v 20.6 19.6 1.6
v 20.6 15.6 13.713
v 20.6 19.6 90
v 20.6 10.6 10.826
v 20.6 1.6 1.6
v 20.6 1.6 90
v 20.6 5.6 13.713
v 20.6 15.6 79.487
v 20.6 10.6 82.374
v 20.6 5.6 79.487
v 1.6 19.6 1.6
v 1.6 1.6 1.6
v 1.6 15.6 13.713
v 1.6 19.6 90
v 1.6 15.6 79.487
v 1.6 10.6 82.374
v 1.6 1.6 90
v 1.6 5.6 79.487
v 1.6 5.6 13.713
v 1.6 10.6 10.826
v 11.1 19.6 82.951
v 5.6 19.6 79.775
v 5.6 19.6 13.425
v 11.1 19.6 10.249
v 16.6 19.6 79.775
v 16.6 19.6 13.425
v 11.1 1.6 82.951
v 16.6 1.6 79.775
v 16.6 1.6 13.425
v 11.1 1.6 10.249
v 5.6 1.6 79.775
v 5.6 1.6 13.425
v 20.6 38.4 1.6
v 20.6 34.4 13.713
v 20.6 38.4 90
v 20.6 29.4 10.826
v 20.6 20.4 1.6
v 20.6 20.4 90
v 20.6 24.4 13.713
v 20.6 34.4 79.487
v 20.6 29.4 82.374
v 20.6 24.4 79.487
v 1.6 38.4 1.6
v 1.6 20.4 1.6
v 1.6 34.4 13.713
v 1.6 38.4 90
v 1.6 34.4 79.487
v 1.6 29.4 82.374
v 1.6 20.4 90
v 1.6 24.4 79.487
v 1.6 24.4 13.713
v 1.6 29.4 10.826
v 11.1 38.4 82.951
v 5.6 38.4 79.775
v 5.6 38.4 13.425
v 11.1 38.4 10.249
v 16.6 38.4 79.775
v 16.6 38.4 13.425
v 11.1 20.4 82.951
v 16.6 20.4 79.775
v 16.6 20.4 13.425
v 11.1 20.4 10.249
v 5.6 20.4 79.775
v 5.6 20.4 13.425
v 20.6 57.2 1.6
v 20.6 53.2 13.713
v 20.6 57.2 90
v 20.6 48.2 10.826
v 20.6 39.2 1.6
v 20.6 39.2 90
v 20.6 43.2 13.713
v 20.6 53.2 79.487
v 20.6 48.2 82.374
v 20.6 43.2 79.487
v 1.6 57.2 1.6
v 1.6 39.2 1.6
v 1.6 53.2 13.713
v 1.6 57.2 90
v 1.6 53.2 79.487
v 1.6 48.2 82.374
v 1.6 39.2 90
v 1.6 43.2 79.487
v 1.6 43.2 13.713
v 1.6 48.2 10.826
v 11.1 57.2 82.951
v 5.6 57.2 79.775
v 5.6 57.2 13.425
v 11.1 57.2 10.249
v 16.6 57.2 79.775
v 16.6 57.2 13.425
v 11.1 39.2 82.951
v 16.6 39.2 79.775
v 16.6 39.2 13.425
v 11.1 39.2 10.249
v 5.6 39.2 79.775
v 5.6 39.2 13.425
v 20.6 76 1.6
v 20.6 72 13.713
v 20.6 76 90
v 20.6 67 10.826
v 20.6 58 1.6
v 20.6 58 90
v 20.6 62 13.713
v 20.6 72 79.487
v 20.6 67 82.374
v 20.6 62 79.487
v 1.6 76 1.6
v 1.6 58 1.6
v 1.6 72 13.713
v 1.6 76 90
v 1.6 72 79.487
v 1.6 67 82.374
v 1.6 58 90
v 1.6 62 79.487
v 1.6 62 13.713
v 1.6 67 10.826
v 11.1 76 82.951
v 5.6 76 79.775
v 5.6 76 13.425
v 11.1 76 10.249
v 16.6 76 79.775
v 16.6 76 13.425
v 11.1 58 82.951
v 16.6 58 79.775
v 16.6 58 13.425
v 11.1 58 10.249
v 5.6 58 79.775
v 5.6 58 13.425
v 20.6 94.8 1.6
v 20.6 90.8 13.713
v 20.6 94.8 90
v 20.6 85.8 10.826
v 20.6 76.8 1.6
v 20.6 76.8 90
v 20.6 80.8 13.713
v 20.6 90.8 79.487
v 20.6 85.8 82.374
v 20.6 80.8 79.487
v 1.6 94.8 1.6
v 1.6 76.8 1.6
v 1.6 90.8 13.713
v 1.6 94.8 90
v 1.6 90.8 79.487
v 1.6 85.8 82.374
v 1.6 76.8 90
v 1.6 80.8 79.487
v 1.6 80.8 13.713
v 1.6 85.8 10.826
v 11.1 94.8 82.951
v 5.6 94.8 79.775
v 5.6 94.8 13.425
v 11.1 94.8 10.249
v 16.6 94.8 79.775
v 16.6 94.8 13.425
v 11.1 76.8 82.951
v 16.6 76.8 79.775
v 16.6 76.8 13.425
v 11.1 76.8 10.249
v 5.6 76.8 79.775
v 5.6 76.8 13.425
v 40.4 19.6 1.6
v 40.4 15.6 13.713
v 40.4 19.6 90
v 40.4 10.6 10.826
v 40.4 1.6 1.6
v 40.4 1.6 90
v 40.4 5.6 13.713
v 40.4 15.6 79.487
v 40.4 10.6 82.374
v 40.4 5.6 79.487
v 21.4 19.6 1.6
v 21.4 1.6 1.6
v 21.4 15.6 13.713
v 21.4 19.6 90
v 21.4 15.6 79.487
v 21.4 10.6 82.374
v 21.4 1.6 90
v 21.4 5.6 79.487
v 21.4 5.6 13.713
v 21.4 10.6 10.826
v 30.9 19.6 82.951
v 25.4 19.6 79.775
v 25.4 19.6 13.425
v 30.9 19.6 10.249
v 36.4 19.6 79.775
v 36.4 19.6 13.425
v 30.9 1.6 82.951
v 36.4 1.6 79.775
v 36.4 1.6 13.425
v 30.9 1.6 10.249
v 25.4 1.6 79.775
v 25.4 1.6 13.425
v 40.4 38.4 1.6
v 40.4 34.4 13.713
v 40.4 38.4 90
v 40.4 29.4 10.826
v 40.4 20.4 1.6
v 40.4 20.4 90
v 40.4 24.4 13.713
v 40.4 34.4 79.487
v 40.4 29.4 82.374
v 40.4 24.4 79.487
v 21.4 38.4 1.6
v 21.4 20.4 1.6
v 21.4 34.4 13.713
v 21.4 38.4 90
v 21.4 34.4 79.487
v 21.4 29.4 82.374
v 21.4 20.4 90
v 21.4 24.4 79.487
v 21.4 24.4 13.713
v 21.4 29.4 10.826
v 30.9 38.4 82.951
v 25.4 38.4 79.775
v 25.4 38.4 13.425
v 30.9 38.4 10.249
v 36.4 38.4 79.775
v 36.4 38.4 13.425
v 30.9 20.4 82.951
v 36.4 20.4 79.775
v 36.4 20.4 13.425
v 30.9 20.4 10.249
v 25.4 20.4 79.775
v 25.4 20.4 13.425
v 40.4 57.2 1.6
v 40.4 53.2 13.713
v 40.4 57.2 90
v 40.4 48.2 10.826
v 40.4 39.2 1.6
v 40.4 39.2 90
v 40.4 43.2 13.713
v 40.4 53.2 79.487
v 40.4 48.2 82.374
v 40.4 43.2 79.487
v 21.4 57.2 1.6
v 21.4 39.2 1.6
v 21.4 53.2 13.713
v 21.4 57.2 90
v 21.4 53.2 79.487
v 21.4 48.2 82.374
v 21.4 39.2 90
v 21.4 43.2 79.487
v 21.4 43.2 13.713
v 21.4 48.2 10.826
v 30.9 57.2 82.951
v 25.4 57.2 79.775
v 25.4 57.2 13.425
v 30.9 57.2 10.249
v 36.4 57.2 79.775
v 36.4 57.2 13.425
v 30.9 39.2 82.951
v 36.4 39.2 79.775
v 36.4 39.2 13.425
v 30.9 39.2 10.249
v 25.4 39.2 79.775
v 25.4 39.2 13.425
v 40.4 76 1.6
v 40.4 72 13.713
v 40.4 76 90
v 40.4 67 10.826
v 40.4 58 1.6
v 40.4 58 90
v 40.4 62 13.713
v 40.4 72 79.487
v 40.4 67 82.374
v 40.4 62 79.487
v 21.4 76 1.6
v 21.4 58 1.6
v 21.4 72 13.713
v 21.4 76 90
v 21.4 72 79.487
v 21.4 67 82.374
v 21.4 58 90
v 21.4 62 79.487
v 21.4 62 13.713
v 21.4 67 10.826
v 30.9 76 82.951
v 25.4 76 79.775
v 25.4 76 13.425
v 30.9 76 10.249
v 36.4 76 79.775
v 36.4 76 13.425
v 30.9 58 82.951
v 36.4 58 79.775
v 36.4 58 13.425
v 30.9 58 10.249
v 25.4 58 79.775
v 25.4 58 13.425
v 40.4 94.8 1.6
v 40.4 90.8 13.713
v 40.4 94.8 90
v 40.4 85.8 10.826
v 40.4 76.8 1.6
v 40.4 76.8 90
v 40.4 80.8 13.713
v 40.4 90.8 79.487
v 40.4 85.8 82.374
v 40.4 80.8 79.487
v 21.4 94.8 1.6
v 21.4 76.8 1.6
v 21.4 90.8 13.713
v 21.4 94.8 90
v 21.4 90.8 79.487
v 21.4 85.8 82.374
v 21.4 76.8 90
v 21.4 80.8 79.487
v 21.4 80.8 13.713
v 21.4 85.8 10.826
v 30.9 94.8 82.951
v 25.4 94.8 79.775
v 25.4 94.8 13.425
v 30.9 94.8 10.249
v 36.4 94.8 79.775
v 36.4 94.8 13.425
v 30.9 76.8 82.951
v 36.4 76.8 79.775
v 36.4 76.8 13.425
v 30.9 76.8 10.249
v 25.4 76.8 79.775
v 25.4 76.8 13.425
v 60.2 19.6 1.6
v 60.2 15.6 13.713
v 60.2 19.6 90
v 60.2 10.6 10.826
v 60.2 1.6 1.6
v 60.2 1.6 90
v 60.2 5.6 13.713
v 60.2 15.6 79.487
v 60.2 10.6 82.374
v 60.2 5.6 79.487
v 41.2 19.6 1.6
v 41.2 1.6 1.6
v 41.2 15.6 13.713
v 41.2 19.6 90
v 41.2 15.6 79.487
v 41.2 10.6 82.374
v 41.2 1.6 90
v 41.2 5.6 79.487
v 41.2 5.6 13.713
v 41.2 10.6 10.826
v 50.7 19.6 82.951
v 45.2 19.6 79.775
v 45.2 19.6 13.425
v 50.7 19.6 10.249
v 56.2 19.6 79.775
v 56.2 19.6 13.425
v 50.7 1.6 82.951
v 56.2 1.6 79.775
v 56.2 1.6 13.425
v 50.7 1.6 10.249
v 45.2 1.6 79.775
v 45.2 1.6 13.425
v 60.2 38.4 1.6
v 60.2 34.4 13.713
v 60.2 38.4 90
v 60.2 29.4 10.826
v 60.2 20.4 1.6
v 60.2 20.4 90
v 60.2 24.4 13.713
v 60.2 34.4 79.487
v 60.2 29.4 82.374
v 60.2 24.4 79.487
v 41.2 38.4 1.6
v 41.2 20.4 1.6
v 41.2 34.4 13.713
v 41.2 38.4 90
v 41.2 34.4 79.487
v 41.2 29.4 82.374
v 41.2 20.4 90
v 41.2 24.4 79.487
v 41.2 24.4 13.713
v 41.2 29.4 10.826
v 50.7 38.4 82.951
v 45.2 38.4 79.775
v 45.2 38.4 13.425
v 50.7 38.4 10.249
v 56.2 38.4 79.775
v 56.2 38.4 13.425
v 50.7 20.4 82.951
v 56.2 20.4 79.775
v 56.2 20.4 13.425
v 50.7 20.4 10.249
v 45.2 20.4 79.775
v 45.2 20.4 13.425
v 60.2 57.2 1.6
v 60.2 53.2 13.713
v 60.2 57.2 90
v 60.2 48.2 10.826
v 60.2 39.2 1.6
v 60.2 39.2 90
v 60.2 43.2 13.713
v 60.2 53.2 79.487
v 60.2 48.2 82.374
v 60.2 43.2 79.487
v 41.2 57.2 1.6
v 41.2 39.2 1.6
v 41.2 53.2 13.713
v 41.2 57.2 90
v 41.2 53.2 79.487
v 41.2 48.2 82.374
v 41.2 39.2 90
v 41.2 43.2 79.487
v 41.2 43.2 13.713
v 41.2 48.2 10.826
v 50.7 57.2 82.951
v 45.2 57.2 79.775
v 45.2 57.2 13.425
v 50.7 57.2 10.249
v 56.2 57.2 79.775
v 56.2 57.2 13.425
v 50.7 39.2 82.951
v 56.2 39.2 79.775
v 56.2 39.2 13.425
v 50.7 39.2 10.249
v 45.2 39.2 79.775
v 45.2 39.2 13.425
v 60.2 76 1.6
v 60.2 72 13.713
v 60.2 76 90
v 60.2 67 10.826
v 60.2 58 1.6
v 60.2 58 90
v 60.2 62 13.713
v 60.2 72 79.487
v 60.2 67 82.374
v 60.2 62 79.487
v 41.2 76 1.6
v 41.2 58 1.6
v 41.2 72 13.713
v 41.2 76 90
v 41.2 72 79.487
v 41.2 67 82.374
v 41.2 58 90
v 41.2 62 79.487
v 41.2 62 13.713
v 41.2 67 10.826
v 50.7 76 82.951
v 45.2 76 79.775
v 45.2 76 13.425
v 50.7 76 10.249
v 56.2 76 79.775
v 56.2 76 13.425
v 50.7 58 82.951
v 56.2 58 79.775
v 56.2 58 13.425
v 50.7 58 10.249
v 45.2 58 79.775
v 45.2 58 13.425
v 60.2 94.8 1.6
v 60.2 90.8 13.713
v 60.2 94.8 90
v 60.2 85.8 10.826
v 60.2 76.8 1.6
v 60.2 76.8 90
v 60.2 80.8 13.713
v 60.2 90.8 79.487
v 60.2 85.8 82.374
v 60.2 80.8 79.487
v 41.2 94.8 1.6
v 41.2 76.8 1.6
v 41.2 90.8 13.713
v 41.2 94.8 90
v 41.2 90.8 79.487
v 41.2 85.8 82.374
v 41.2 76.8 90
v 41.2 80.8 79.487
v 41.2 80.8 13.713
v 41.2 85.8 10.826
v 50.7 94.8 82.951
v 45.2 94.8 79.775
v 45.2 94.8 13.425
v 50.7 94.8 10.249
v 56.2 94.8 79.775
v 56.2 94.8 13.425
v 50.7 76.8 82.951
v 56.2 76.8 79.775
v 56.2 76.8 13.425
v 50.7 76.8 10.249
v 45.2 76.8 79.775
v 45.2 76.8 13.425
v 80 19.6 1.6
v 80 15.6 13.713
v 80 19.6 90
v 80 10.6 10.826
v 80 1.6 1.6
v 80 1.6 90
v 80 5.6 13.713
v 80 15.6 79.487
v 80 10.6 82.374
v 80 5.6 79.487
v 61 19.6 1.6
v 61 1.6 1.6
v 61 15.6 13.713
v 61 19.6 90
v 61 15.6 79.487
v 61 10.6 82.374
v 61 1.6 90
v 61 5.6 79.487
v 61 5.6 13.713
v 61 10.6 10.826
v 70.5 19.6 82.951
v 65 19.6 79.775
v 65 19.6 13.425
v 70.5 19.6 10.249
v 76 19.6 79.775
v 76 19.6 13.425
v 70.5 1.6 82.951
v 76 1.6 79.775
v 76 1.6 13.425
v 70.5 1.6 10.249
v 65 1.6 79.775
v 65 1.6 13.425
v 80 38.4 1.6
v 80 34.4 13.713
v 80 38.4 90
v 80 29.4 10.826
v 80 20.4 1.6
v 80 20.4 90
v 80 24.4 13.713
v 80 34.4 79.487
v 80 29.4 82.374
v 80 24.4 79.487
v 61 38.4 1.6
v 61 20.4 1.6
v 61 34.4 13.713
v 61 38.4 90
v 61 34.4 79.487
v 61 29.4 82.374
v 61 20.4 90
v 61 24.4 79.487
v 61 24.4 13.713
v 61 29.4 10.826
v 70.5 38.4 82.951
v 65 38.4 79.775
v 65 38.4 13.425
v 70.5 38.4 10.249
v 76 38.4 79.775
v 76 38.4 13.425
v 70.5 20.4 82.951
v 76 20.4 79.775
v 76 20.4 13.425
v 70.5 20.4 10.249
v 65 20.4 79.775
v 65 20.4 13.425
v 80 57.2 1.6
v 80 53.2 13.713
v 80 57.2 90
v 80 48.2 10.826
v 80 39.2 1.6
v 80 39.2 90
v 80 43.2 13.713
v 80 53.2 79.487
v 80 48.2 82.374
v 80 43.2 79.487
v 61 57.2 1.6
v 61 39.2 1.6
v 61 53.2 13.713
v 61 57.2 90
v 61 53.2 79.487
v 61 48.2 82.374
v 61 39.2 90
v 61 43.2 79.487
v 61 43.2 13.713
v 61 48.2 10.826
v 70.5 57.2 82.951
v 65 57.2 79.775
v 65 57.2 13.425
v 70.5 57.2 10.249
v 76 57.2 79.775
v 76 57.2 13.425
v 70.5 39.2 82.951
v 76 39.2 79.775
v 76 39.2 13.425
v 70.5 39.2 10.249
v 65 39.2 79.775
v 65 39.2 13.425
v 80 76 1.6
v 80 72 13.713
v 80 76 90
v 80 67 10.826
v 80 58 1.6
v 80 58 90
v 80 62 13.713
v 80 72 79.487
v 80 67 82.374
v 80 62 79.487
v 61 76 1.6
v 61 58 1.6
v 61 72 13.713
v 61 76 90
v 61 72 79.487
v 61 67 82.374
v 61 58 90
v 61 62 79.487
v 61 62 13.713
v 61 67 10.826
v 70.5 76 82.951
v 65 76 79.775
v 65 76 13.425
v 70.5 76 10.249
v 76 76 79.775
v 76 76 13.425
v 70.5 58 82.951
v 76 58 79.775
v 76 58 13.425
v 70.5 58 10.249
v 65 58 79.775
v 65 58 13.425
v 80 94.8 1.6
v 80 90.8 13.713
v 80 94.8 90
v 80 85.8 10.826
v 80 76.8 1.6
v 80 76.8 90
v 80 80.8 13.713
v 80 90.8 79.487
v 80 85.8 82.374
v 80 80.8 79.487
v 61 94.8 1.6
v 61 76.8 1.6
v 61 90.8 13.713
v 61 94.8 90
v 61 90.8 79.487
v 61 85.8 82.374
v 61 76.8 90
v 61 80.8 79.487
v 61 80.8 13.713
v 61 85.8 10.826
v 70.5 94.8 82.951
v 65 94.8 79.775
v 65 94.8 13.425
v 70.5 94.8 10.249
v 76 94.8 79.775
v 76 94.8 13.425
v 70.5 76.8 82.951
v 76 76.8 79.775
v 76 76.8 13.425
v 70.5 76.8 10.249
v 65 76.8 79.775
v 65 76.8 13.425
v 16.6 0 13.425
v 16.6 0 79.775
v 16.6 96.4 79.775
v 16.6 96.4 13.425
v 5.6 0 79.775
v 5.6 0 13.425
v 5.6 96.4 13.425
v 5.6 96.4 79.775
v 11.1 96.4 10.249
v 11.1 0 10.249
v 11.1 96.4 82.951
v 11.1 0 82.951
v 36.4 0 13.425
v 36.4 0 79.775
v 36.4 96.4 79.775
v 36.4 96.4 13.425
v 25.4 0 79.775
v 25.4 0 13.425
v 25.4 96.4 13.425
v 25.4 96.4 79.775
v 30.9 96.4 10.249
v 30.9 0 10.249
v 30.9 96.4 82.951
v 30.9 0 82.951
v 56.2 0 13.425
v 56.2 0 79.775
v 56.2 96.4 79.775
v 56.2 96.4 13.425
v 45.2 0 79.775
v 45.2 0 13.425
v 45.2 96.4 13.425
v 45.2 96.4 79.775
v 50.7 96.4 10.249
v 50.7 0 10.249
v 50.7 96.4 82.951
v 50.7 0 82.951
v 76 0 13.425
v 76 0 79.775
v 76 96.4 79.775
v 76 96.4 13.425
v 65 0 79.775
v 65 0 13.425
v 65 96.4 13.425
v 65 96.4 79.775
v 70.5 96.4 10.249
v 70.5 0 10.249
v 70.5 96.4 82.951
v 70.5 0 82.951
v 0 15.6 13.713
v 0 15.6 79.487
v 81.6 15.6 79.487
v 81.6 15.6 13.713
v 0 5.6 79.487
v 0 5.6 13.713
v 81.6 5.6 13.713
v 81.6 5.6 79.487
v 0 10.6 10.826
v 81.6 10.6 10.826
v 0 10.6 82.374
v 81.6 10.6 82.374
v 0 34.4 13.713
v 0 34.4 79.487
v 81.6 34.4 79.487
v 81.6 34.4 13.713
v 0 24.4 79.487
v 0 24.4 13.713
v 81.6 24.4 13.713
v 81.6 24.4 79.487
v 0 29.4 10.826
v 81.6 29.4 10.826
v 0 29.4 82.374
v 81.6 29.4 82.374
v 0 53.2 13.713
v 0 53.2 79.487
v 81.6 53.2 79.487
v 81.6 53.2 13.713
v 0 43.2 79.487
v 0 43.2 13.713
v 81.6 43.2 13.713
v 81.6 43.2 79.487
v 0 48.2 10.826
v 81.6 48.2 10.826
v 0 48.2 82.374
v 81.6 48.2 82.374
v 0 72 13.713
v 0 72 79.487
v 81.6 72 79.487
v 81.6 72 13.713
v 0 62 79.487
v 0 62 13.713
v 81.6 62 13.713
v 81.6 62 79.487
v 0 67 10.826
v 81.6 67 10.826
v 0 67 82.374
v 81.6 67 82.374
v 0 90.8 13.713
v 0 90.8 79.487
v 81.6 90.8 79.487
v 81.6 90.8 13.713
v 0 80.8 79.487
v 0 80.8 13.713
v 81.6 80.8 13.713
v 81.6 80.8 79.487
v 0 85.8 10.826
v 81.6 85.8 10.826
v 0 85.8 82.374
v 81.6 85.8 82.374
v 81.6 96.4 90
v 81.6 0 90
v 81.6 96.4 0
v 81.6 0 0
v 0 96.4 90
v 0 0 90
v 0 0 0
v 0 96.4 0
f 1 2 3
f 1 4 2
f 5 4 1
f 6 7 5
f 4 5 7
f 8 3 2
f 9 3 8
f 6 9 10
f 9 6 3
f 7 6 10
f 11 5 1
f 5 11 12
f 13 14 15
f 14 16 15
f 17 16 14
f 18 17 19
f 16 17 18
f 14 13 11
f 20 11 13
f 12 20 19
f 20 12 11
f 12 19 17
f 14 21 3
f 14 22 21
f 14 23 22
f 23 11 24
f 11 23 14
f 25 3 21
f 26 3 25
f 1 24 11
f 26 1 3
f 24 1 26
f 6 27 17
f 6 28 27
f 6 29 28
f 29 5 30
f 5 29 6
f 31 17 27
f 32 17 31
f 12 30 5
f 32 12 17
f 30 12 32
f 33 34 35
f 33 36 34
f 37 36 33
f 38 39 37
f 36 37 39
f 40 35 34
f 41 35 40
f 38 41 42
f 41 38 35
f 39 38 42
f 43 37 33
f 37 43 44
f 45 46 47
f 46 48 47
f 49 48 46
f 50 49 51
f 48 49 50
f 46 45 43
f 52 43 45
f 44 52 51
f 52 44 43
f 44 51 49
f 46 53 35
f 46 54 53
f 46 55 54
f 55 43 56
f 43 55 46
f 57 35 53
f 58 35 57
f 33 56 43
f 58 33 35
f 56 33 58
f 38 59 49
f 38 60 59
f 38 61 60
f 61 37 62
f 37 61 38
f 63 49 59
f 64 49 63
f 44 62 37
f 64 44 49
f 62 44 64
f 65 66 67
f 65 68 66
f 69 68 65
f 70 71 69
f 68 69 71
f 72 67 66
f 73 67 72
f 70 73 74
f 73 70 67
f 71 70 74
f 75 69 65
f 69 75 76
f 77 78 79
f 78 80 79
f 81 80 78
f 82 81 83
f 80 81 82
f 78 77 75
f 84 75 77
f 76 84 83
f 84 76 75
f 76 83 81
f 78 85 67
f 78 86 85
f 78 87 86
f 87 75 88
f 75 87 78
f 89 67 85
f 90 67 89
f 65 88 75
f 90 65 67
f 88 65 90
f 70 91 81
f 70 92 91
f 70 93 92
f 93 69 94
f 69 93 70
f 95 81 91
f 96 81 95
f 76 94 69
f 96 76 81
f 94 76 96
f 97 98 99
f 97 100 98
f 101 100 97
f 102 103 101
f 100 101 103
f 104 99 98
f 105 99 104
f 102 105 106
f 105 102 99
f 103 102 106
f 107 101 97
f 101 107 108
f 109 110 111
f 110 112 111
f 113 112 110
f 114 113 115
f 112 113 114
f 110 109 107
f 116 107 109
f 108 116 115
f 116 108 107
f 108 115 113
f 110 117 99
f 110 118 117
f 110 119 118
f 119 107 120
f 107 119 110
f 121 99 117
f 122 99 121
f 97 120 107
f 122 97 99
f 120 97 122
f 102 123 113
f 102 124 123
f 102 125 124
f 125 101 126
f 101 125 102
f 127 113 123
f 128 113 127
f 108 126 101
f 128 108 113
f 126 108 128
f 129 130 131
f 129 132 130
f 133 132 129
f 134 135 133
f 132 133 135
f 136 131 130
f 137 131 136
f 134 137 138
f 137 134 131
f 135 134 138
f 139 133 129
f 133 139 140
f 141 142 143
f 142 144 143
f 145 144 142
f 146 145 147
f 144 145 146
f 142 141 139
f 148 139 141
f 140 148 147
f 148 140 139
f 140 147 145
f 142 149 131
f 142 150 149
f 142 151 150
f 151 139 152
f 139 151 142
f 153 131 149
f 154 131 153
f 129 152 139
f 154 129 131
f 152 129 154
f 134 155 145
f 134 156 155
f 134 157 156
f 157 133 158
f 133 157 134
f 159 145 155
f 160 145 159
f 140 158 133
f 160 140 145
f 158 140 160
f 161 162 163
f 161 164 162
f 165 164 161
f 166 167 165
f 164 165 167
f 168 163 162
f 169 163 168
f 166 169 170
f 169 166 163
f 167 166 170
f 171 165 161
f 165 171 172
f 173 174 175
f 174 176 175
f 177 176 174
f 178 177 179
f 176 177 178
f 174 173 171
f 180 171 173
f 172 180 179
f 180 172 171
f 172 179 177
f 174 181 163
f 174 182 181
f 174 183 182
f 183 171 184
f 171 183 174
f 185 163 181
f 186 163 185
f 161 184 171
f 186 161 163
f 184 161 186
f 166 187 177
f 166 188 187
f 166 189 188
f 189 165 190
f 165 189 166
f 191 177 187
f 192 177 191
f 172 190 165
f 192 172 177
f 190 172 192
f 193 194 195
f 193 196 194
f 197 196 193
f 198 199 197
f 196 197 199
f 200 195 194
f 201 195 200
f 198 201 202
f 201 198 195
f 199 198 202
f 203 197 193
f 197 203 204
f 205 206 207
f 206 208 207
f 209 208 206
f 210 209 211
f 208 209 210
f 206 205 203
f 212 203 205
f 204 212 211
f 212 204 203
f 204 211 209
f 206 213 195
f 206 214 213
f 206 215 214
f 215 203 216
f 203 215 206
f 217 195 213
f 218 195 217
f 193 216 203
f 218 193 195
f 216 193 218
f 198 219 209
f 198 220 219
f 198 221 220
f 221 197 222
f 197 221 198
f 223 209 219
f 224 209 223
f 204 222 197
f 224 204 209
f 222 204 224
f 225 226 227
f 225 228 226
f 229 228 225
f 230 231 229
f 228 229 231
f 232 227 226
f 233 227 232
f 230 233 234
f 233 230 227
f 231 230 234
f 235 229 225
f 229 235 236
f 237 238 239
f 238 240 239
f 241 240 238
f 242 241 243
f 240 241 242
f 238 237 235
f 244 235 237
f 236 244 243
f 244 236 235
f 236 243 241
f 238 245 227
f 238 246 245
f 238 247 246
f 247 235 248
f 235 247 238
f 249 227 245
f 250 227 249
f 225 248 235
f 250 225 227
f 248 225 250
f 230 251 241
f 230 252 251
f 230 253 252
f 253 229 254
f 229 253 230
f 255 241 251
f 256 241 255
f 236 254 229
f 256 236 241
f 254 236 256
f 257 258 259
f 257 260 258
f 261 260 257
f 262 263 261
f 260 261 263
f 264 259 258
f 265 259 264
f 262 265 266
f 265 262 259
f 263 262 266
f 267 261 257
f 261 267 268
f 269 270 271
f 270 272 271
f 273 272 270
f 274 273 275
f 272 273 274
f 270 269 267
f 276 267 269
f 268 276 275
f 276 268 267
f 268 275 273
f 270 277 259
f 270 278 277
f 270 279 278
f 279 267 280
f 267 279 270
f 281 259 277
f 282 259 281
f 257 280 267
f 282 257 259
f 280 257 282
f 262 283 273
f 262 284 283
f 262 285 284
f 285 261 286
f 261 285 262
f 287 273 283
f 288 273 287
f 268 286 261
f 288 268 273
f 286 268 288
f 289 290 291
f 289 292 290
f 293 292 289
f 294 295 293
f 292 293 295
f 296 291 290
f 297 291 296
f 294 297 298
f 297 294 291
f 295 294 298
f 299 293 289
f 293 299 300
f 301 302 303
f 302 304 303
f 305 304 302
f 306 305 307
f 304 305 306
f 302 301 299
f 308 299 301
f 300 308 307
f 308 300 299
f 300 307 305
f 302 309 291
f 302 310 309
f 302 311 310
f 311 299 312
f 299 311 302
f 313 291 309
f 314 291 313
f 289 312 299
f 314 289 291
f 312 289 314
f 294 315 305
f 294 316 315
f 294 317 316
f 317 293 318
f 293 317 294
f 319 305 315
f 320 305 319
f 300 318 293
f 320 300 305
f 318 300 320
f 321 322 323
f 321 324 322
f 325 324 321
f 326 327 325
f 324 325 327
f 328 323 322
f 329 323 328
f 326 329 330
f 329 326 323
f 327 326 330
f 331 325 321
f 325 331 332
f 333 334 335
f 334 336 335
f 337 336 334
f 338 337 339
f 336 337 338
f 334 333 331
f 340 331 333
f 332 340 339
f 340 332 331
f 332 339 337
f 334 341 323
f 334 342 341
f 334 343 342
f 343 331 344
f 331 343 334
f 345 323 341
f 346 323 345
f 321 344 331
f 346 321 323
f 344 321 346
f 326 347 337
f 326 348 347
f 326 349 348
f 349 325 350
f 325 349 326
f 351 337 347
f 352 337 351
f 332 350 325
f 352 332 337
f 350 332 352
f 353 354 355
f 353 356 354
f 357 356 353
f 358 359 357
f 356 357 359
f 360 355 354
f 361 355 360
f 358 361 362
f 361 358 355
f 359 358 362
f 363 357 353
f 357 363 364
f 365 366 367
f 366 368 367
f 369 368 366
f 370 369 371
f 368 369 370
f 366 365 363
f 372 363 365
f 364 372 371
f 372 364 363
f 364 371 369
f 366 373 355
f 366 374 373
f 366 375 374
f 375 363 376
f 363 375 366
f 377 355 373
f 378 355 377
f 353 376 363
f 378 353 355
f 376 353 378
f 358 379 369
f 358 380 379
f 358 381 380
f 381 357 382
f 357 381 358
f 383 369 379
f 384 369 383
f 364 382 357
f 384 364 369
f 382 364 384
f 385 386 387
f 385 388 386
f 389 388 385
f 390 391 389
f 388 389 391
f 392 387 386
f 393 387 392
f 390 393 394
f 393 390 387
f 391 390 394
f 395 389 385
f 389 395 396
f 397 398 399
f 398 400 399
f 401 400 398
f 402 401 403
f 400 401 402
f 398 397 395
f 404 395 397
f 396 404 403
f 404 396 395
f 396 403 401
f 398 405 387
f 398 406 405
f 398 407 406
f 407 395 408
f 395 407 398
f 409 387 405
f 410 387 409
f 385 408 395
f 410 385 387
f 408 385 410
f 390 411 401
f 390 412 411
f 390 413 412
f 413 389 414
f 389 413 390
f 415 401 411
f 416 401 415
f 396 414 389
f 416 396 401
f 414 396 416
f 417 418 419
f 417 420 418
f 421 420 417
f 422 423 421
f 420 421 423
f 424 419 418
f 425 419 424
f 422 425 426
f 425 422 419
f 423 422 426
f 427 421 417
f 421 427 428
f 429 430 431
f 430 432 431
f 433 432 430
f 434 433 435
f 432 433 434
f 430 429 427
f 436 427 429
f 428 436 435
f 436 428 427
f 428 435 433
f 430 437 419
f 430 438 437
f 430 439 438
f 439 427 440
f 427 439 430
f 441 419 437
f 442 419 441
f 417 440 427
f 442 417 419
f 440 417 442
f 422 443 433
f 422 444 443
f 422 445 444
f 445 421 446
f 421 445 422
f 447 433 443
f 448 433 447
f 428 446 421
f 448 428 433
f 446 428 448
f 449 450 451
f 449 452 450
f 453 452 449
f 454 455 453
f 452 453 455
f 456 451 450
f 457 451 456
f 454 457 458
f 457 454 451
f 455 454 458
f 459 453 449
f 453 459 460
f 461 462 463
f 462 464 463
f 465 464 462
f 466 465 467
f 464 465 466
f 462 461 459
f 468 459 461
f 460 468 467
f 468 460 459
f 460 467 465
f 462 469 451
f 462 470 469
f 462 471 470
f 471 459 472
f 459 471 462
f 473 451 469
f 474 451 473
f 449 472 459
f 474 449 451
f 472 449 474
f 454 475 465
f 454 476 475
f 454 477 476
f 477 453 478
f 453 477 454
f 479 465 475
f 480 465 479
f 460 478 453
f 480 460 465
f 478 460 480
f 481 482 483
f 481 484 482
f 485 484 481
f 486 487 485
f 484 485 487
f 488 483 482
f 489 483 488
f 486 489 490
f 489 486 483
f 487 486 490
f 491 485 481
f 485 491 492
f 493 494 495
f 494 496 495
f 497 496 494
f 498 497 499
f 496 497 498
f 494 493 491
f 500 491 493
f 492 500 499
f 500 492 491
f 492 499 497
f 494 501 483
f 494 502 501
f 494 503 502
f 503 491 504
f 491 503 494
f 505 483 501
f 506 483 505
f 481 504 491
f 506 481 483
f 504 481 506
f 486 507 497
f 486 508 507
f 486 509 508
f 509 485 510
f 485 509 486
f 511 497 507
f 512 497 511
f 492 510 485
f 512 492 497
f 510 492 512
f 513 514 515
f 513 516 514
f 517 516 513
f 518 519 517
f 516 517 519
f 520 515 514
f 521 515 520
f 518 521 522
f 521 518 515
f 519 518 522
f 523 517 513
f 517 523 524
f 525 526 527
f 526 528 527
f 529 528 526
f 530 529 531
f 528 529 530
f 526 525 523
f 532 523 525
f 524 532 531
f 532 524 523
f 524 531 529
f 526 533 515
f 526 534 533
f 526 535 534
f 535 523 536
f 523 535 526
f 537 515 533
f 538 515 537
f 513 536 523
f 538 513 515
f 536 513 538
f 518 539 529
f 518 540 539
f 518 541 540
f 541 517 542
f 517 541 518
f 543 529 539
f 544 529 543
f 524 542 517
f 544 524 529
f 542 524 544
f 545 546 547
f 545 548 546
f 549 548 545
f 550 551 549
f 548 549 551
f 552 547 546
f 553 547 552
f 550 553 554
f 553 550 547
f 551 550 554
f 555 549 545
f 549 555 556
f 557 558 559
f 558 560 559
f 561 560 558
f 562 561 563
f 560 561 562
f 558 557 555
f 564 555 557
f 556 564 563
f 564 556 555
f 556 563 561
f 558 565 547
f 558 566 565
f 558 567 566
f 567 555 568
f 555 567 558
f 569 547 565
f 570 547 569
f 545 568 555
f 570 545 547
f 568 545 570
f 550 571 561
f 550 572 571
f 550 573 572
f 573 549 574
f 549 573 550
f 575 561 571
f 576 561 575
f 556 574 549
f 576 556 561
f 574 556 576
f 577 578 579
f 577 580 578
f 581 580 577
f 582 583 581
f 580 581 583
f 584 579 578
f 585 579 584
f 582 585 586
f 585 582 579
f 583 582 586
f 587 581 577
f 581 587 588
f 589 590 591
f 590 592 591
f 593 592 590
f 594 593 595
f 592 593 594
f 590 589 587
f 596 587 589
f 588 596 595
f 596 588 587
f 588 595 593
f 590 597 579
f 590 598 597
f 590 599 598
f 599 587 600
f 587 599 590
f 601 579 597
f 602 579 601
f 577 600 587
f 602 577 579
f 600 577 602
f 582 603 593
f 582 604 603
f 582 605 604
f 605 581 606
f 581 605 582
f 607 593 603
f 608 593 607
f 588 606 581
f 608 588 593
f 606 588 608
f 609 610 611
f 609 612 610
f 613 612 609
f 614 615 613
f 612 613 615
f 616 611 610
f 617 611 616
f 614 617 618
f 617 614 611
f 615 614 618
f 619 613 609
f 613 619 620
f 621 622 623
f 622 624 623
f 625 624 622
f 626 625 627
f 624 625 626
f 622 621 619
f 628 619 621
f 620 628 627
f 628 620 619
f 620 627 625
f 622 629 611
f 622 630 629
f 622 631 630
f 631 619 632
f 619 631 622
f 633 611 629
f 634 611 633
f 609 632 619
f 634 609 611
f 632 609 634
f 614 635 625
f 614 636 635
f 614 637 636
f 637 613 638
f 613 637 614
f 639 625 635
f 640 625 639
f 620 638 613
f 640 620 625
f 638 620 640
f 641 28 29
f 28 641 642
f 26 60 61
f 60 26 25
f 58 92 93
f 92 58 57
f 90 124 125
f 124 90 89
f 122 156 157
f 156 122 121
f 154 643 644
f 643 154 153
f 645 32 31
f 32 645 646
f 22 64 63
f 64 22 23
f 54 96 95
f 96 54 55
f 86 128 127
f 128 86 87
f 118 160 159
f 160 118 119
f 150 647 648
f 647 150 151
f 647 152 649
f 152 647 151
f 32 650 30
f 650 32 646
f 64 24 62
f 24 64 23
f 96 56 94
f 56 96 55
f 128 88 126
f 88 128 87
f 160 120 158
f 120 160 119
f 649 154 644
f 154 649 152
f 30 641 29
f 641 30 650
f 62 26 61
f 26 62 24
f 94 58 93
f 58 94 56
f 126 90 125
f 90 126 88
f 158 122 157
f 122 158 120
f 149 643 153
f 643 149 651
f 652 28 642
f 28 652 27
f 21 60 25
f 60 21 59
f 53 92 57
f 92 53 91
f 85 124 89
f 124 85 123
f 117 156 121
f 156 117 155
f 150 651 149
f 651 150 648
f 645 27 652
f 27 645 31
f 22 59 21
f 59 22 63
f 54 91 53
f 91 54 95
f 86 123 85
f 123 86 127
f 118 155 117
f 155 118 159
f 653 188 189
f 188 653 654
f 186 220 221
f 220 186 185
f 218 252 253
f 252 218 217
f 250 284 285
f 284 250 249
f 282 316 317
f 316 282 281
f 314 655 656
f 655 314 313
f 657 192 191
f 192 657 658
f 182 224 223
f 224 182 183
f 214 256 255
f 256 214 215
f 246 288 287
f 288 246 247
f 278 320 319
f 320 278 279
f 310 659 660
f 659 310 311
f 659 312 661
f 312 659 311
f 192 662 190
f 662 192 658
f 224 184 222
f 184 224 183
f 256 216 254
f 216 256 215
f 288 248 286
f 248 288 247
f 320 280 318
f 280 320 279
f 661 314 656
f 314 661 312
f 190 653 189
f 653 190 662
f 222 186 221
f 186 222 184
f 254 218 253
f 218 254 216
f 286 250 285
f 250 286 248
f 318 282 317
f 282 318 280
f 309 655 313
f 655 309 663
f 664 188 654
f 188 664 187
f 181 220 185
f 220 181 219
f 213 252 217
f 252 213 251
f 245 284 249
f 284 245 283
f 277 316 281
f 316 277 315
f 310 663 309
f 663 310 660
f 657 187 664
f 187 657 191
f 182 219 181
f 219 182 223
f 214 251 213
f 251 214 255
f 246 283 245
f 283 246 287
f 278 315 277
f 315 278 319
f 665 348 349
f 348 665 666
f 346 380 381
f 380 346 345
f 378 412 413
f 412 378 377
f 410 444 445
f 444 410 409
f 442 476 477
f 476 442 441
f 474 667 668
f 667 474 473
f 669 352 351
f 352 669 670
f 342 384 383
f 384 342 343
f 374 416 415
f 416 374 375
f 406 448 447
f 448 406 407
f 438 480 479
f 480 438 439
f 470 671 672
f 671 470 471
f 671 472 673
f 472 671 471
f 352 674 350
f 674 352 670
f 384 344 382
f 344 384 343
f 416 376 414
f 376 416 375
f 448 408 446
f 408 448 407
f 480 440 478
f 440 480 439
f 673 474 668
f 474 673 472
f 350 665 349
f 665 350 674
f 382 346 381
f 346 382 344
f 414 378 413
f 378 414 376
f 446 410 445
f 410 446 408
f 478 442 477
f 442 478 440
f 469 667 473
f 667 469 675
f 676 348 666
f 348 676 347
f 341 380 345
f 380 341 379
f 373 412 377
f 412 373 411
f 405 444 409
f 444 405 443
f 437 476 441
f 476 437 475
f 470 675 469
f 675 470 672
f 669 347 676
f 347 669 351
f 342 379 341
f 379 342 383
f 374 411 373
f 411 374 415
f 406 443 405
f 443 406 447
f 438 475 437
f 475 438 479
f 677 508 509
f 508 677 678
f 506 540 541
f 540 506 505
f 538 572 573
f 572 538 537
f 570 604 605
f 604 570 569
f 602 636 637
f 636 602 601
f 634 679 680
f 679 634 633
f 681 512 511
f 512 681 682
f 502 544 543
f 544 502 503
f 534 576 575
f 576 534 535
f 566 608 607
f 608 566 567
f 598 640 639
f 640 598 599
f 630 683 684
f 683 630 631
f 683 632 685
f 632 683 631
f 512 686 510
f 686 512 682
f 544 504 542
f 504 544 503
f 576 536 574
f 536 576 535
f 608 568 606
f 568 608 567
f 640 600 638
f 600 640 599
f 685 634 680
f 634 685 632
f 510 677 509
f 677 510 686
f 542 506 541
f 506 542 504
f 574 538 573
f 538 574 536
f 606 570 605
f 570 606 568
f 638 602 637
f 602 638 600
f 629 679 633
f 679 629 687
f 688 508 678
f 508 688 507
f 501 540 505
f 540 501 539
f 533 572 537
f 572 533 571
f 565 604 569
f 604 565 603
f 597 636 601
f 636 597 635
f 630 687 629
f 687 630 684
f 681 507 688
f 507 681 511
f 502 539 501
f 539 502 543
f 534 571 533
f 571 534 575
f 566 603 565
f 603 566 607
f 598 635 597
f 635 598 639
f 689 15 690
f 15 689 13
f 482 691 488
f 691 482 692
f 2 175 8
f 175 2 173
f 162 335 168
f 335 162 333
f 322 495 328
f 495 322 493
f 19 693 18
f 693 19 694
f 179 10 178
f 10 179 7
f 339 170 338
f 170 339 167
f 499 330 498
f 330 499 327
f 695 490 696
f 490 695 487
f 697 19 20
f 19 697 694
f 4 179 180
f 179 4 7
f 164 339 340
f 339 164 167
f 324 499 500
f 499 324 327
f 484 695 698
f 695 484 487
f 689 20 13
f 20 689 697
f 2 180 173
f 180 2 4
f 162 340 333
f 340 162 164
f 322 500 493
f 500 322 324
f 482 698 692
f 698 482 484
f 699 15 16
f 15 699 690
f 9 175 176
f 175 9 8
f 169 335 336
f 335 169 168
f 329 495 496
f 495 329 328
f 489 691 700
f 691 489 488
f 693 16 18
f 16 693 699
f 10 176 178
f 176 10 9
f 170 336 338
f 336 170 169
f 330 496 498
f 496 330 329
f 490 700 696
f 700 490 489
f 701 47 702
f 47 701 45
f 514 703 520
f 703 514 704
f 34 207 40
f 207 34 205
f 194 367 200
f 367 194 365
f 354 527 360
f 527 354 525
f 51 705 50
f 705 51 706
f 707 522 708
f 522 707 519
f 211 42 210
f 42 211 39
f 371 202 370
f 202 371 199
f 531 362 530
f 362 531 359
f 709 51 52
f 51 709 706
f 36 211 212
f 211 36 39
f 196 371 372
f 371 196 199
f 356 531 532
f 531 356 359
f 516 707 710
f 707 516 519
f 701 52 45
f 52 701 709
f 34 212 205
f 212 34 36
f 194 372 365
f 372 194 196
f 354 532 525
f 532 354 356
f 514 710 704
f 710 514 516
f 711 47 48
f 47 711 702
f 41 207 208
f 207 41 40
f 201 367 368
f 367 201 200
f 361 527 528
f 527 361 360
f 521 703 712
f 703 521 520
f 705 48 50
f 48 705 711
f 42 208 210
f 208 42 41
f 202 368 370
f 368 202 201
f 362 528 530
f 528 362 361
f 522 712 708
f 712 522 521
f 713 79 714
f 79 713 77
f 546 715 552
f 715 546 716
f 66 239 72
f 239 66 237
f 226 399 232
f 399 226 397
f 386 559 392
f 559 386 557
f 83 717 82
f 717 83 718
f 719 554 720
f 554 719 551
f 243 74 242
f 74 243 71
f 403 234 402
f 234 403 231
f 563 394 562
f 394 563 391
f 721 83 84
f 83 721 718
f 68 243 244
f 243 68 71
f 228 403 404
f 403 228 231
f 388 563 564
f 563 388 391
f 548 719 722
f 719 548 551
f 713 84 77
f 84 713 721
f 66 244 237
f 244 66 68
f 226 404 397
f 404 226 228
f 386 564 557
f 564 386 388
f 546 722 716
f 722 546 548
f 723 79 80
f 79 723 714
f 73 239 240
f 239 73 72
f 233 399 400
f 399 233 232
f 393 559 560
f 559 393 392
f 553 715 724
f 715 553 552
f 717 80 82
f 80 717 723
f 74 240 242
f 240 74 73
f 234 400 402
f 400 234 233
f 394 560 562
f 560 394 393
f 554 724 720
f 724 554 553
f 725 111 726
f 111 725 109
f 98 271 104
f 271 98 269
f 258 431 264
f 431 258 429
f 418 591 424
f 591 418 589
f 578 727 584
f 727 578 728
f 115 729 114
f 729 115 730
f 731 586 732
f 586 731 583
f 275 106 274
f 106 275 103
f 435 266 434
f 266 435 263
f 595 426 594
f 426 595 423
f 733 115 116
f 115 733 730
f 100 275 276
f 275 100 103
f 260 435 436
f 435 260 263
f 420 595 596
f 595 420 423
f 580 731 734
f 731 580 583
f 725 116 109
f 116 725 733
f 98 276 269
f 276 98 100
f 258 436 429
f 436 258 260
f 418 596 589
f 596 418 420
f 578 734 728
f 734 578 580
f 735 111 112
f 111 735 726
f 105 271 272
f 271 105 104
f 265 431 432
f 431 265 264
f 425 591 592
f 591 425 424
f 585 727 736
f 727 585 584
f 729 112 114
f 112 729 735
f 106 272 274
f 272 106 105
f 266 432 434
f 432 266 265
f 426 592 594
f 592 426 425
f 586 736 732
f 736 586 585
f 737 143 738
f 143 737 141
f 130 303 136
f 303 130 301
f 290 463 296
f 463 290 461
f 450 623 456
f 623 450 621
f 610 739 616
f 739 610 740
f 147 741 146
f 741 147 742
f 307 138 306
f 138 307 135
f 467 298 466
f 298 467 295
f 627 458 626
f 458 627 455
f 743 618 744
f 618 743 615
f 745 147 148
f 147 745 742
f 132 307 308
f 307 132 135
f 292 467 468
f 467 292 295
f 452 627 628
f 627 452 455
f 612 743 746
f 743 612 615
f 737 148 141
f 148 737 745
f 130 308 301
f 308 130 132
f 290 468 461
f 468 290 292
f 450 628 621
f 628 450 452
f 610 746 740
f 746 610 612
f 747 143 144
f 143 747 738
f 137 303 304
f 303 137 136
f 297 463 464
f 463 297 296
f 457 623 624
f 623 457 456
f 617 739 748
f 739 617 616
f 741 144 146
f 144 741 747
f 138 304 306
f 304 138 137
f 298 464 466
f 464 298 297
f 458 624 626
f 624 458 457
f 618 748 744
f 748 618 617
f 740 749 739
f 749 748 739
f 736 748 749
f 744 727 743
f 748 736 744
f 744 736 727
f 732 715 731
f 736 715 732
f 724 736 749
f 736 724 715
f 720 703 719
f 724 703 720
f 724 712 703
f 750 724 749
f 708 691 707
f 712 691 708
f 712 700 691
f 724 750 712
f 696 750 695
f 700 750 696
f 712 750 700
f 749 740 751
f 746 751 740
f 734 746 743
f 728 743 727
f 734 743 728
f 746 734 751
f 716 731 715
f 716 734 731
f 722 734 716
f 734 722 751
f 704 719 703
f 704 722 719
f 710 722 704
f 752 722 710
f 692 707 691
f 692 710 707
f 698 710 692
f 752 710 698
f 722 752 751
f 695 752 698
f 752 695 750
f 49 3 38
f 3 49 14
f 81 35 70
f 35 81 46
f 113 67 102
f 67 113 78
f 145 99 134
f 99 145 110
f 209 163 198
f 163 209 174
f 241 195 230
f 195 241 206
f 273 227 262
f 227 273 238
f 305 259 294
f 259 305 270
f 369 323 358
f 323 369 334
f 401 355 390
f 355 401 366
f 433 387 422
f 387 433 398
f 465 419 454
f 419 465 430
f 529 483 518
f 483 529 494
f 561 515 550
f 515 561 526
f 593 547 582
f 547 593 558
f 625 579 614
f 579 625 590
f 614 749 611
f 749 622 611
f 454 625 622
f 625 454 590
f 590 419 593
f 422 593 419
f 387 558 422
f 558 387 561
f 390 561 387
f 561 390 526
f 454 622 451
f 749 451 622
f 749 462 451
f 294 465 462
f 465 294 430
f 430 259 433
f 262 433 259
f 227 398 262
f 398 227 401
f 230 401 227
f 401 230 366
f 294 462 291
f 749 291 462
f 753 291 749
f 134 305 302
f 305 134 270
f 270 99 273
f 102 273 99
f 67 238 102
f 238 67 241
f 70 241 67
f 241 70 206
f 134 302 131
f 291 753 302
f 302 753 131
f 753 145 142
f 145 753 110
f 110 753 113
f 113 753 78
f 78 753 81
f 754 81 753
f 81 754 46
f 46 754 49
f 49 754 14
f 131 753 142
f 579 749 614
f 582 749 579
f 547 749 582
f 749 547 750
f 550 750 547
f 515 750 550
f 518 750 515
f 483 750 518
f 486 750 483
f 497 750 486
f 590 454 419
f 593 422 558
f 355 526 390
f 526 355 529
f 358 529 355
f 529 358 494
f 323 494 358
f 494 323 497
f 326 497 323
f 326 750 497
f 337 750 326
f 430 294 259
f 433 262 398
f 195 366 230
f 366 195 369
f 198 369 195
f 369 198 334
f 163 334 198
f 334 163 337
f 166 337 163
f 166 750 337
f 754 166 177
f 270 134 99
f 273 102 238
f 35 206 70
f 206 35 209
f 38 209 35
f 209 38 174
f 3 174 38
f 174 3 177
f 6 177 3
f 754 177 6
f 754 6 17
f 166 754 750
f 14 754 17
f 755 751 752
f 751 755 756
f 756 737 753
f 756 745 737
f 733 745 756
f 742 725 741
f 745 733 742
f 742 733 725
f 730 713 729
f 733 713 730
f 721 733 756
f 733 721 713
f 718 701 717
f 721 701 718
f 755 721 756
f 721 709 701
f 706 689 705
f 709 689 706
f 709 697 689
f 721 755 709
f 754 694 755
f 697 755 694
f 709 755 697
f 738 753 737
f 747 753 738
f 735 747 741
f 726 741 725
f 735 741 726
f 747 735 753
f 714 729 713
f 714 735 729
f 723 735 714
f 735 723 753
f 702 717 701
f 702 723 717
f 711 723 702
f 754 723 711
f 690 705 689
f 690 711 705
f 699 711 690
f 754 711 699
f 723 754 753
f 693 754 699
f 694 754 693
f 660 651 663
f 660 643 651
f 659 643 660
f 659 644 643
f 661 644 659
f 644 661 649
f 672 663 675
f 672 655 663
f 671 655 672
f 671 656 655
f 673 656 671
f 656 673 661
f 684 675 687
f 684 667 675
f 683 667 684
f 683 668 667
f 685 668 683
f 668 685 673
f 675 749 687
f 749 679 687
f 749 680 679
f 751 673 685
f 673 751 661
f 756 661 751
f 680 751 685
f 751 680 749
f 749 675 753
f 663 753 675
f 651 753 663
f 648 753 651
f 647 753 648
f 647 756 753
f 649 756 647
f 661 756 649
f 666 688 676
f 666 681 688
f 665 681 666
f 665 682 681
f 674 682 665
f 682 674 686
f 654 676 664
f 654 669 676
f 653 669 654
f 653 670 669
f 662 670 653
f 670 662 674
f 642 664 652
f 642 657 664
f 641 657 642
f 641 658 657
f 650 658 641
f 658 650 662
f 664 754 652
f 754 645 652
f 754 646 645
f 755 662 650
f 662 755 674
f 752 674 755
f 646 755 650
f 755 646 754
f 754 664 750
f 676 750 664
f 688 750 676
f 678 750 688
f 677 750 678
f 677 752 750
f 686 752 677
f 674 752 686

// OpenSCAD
// Horizontal slot count
n = 4;

// Vertical slot count
m = 5;

// Width of each slot
slot_width = 19;

// Width of cutout
cutout_width = 4;

// Length of each slot
slot_length = 18;

// Length of cutout
cutout_length = 4;

// Height of each slot
slot_height = 90;

// Height of cutout
cutout_height = 15;

// Outer wall thickeness
outer_wall = 1.6;

// Inner wall thickeness
inner_wall = 0.8;

module base() {
    let(
        t_outer = 2 * outer_wall,
        t_inner_width = (n - 1) * inner_wall,
        t_inner_length = (m - 1) * inner_wall,
        all_slots_width = n * slot_width,
        all_slots_length = m * slot_length,
        width = t_outer + t_inner_width + all_slots_width,
        length = t_outer + t_inner_length + all_slots_length,
        height = t_outer + slot_height
    ) {
        cube([width, length, slot_height]);
    }
}

difference() {
    base();

    for(x = [1:n]) {
        for(y = [1:m]) {
            let(
                x_shift = outer_wall + (x-1) * (inner_wall + slot_width),
                y_shift = outer_wall + (y-1) * (inner_wall + slot_length)
            )
            translate([x_shift, y_shift, outer_wall])
                cube([slot_width, slot_length, slot_height + 1]);

        }
    }

    for(x = [1:n]) {
        let(
            width = slot_width - (2 * cutout_width),
            x_shift = outer_wall + cutout_width + (x-1) * (inner_wall + slot_width),
            height = slot_height - 2 * cutout_height
        ) {
            translate([x_shift, -1, outer_wall + cutout_height])
                union() {
                    cube([width, 1000, height]);
                    translate([width/2, -1, 0]) rotate([270, 30, 0])
                        cylinder(1000, d=width/cos(30), center=false, $fn=6);
                    translate([width/2, -1, height]) rotate([270, 30, 0])
                        cylinder(1000, d=width/cos(30), center=false, $fn=6);
                }
        }
    }

    for(y = [1:m]) {
        let(
            length = slot_length - (2 * cutout_length),
            y_shift = outer_wall + cutout_length + (y-1) * (inner_wall + slot_length),
            height = slot_height - 2 * cutout_height
        ) {
            translate([-1, y_shift, outer_wall + cutout_height])
                union() {
                    cube([1000, length, height]);
                    translate([-1, length/2, 0]) rotate([0, 90, 0])
                        cylinder(1000, d=length/cos(30), center=false, $fn=6);
                    translate([-1, length/2, height]) rotate([0, 90, 0])
                        cylinder(1000, d=length/cos(30), center=false, $fn=6);
                }
        }
    }

}

%translate([outer_wall, outer_wall, outer_wall])
    cube([slot_width, slot_length, 75]);
